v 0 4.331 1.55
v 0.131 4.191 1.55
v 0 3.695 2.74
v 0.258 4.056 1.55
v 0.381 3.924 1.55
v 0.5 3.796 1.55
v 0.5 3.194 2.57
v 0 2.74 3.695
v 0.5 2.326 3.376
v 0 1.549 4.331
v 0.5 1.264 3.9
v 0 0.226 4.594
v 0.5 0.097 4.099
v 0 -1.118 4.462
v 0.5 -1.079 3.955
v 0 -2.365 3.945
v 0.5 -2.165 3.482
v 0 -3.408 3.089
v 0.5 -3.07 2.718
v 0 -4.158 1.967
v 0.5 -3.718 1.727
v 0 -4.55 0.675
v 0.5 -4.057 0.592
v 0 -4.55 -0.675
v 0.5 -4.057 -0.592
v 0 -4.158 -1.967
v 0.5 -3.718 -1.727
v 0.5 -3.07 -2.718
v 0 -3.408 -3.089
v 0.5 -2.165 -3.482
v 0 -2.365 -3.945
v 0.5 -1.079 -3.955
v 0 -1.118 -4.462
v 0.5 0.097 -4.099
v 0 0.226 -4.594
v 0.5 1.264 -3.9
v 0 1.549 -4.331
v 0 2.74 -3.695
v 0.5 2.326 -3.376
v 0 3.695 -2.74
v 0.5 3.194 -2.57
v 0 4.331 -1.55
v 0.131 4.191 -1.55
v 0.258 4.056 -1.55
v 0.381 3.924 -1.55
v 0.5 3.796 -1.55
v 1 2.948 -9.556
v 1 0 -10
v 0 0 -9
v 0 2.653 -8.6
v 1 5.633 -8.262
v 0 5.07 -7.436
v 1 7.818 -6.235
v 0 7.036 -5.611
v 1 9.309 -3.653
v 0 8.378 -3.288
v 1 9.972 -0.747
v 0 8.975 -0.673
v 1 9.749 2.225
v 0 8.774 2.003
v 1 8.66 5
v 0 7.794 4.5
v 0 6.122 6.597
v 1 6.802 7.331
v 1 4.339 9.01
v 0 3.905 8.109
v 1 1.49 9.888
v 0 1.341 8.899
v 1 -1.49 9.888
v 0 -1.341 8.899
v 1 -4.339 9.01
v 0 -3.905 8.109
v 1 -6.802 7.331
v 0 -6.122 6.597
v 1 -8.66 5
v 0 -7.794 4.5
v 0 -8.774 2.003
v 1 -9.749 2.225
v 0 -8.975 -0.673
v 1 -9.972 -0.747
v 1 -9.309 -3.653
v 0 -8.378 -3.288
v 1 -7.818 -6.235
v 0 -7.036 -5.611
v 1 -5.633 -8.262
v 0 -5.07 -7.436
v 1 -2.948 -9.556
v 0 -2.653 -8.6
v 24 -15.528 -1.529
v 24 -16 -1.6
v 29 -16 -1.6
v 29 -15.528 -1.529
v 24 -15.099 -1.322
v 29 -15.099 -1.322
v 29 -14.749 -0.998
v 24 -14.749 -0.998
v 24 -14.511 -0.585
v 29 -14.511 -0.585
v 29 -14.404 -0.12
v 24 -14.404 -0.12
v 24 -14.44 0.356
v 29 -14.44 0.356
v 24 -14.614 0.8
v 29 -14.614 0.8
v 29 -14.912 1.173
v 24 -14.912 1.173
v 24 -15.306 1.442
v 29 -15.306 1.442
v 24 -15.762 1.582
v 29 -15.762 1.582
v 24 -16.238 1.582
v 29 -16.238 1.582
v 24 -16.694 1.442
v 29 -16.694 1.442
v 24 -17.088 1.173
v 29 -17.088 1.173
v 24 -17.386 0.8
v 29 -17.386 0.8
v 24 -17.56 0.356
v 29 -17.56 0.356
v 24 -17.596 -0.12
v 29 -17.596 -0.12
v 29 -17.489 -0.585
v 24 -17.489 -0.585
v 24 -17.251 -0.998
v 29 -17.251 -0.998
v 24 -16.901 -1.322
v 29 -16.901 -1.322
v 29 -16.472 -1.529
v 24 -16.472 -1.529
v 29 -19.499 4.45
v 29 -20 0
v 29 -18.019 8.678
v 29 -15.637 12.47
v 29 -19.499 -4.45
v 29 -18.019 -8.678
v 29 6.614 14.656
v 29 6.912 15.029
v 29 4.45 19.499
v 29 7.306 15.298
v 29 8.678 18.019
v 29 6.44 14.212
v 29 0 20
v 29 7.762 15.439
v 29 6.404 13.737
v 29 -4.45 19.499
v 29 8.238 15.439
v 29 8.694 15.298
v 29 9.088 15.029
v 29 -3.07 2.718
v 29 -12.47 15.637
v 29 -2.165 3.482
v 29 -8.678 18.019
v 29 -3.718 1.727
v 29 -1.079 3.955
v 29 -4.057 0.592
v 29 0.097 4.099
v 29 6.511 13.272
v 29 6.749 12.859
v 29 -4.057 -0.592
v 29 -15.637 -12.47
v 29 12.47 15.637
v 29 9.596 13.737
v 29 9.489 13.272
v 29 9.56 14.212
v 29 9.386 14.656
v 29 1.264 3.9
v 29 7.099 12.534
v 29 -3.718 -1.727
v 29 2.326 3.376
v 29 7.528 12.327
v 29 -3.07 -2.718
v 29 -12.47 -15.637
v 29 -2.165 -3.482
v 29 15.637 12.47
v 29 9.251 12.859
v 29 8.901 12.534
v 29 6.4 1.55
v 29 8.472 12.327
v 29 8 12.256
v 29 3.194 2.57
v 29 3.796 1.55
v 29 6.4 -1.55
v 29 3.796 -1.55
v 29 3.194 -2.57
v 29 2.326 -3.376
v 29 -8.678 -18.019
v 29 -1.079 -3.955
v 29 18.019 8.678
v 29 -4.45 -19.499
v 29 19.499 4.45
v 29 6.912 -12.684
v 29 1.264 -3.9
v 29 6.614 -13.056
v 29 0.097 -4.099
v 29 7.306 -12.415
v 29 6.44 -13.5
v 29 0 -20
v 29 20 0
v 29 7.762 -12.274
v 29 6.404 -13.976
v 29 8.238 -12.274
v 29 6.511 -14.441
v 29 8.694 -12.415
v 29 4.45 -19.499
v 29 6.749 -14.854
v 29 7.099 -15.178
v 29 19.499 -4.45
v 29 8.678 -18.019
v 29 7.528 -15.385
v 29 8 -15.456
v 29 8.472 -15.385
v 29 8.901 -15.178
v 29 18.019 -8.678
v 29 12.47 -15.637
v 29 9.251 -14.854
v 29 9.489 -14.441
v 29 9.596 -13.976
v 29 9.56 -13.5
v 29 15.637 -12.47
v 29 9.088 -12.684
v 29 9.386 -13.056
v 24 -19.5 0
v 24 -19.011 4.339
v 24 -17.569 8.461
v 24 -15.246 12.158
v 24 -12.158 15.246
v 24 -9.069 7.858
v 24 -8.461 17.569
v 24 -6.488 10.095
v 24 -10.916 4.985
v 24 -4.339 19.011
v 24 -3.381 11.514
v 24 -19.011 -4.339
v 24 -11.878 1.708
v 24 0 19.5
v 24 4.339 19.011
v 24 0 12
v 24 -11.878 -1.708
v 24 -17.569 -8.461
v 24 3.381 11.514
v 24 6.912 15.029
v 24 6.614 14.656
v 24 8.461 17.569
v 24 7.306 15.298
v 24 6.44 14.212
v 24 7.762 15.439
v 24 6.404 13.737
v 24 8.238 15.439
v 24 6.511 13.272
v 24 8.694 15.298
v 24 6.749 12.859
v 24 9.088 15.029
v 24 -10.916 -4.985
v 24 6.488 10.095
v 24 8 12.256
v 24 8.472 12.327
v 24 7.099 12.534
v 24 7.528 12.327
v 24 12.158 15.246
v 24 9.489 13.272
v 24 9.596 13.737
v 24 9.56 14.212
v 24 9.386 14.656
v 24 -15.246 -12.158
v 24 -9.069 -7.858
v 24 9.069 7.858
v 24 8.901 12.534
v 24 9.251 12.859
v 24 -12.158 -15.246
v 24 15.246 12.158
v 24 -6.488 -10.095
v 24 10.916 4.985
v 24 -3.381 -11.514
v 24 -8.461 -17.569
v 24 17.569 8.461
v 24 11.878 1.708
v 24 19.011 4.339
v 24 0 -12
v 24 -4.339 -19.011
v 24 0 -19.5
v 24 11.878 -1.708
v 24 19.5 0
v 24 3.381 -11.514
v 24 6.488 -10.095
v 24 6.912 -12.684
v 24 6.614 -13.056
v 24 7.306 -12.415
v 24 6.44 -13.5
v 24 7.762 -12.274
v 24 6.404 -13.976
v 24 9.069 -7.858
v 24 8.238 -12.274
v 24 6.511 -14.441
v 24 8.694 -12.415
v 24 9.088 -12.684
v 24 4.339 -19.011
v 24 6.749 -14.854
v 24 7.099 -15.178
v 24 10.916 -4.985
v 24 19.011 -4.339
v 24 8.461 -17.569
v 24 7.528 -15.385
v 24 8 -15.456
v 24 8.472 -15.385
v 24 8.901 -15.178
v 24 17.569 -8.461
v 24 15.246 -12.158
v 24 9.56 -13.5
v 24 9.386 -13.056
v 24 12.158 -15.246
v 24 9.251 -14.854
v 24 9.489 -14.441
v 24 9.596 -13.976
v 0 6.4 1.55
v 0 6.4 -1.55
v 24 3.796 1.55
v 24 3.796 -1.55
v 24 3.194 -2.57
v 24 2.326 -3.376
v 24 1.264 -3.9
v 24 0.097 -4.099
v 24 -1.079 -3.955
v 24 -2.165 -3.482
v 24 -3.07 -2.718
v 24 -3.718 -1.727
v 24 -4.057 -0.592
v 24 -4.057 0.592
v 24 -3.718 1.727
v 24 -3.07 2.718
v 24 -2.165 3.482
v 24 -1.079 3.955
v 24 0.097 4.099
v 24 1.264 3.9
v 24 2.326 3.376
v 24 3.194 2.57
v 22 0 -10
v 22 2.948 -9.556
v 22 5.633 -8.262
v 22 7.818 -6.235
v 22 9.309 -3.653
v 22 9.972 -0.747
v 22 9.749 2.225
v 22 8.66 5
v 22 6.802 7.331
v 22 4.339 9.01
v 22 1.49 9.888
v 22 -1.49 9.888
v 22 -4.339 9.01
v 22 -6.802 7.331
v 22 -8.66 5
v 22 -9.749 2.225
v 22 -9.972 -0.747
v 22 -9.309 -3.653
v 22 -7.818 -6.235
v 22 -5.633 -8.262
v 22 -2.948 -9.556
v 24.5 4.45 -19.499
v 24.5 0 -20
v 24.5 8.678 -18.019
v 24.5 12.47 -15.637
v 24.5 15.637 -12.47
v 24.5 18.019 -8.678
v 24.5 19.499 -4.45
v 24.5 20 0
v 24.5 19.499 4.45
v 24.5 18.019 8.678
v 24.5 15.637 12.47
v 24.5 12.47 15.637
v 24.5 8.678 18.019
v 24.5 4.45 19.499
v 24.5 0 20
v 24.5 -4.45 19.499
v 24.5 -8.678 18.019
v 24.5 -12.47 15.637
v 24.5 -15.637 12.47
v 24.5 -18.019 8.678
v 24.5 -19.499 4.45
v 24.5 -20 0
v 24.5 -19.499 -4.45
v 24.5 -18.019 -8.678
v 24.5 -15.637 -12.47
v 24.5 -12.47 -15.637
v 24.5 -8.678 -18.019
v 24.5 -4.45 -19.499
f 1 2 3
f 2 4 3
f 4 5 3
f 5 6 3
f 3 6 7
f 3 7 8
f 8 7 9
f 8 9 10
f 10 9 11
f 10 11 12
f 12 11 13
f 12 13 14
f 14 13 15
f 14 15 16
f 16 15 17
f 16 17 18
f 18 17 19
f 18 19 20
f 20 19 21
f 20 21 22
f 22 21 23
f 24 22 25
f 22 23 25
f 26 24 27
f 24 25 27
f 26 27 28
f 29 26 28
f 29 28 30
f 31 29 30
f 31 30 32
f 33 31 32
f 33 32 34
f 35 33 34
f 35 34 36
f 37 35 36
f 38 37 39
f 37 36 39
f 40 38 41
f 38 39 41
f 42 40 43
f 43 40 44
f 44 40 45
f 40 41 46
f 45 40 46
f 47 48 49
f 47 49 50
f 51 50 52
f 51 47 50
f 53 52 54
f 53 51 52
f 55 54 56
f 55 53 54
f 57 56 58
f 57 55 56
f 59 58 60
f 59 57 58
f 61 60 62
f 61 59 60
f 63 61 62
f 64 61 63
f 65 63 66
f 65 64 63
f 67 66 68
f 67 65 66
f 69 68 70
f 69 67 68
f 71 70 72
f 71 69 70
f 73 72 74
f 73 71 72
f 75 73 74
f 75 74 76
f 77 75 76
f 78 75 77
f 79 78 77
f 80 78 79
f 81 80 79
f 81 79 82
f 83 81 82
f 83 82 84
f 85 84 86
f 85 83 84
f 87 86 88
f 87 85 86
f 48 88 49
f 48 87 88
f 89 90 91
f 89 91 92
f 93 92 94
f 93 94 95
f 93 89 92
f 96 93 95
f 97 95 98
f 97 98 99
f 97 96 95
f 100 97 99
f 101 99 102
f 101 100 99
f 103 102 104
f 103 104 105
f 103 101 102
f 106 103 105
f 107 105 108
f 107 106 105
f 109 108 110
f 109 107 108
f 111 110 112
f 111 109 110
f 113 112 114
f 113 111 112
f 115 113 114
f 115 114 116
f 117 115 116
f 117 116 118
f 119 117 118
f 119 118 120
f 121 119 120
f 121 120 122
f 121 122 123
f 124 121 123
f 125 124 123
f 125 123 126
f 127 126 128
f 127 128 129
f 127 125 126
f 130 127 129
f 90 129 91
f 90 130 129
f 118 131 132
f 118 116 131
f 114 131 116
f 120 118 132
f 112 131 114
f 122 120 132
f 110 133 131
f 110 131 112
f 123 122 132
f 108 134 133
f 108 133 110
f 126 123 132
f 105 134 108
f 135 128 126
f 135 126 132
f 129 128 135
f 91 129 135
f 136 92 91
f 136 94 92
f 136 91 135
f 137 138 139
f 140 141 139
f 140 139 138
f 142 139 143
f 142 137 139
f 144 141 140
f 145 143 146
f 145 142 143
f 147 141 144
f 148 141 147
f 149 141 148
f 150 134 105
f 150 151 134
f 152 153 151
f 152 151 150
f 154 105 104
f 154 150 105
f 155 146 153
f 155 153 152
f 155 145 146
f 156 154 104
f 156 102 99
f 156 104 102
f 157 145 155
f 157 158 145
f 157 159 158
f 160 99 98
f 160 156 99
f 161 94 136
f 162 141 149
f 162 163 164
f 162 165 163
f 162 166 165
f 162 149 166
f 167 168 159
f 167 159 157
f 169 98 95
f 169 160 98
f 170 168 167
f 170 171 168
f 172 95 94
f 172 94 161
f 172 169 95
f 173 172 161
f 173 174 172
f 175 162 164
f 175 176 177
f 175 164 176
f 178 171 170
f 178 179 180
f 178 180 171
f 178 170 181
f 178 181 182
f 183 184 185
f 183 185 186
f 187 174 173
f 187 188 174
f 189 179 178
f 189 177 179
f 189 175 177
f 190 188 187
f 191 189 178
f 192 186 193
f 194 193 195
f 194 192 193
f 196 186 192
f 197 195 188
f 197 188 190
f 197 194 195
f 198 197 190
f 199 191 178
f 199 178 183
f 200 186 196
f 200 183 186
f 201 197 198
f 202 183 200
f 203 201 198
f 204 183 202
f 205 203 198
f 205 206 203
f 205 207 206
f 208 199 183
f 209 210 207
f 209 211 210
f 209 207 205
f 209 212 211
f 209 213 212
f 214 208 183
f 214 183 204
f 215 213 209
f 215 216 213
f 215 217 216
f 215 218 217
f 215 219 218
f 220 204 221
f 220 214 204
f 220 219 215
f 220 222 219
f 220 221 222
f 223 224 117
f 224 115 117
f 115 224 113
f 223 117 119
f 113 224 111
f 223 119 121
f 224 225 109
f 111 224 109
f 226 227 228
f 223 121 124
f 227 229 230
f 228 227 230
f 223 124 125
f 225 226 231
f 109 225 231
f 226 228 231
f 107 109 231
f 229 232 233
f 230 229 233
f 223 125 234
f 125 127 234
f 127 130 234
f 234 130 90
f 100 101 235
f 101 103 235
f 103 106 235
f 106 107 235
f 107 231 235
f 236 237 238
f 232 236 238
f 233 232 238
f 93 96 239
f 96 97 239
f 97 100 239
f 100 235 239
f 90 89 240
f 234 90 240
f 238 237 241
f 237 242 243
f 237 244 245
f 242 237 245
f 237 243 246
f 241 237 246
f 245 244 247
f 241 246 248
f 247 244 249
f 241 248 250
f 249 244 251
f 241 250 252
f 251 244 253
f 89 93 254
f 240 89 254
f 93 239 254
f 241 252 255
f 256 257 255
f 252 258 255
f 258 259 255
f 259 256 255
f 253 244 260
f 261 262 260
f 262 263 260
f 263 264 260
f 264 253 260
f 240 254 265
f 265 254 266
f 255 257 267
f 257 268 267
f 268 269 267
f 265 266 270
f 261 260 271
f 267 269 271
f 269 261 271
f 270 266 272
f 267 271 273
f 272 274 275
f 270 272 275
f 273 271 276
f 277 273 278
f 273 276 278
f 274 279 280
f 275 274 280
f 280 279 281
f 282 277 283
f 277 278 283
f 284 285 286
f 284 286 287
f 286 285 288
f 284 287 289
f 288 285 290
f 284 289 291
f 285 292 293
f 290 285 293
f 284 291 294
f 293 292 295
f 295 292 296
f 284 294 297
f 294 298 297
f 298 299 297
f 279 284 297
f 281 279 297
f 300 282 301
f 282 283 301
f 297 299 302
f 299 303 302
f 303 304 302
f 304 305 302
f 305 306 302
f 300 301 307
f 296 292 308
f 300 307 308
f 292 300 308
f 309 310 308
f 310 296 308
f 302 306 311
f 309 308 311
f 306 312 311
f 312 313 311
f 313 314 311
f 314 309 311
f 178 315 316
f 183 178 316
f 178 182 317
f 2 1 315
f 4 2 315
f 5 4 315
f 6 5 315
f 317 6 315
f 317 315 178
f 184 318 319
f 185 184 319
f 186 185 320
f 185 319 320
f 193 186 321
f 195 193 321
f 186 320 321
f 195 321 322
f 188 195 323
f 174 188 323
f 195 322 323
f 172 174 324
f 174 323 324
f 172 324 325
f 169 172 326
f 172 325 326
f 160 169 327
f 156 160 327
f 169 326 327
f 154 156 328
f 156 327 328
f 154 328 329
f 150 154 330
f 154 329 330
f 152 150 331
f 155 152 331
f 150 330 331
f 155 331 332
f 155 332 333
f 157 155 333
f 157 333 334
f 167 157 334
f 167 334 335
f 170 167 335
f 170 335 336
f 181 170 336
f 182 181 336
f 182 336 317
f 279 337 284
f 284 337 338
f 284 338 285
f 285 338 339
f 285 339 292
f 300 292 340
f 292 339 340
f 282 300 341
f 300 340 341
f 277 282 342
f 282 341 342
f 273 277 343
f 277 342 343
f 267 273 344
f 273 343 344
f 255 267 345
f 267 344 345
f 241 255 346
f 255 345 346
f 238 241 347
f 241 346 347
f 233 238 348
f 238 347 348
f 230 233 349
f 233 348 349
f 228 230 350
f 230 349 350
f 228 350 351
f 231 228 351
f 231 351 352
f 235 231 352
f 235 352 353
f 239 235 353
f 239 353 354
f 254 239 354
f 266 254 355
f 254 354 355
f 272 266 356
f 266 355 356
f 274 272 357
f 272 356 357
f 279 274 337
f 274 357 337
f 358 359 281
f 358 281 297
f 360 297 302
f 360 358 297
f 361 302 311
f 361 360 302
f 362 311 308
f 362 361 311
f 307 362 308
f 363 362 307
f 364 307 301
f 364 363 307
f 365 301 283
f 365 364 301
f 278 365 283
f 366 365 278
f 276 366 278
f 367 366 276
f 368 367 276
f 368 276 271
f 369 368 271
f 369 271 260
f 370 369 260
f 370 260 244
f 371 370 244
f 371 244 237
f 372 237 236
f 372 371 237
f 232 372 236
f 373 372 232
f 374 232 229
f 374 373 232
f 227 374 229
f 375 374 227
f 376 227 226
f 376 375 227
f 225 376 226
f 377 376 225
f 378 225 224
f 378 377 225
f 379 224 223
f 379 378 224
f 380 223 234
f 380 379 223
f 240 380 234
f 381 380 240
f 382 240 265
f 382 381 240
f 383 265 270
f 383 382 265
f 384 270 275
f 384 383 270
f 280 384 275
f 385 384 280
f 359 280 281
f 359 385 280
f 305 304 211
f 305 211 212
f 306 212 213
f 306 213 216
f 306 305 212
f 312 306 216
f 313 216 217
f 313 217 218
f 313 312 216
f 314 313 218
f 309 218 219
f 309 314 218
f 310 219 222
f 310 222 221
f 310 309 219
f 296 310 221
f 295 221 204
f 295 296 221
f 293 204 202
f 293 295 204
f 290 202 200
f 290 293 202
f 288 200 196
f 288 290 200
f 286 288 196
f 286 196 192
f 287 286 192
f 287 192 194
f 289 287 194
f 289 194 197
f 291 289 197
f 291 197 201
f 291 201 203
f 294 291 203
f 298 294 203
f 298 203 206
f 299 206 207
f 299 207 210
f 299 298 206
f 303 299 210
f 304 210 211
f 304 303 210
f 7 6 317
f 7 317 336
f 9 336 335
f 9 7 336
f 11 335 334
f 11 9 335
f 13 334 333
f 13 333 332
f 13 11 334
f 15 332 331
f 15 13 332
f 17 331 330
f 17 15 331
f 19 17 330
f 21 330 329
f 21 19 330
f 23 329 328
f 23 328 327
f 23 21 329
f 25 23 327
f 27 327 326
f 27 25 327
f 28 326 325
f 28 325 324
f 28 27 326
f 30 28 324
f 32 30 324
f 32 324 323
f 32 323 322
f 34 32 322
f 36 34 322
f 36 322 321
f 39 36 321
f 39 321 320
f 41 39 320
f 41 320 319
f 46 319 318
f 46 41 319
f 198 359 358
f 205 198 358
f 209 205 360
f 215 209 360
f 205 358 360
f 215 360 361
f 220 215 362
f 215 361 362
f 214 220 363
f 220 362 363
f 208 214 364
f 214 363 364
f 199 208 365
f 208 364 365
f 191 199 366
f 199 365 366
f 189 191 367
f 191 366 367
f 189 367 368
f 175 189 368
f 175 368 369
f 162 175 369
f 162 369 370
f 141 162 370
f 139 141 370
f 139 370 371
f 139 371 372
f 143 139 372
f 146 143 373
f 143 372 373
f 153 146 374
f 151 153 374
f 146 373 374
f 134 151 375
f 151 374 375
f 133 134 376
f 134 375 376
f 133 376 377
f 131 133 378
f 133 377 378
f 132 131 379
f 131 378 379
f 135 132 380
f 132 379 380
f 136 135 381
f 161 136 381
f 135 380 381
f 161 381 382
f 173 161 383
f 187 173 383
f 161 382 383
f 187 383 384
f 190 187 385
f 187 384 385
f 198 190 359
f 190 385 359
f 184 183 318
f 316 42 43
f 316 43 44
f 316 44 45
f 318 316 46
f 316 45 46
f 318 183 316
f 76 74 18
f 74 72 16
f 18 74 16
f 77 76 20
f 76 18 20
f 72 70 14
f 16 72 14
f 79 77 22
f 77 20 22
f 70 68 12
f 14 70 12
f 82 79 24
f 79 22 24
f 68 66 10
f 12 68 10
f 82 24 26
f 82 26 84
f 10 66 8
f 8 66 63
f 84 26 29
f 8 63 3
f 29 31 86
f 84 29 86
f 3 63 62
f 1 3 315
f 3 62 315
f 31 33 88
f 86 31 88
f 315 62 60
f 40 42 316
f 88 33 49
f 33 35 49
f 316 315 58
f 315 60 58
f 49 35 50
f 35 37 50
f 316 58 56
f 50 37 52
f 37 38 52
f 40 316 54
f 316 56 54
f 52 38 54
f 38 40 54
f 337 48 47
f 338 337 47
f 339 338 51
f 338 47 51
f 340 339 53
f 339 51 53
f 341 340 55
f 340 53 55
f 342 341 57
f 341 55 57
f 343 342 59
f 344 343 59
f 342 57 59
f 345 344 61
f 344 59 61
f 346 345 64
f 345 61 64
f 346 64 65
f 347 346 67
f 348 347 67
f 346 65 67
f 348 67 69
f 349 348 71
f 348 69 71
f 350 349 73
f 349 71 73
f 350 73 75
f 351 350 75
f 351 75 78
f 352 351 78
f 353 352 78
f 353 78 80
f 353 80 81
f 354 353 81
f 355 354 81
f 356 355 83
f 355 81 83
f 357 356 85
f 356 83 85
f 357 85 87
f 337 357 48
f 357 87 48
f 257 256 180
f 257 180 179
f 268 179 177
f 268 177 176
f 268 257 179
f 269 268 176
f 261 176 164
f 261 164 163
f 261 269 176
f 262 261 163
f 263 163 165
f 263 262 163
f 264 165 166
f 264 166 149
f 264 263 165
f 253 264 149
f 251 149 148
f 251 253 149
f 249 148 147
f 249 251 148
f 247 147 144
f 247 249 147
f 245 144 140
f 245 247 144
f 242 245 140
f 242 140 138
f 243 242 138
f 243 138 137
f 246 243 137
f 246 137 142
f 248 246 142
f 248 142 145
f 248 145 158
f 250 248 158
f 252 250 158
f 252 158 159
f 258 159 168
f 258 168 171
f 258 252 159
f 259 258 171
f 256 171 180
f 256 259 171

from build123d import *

# Parameters (mm, degrees)
SKETCH_1_R          = 10
EXTRUDE_1_DEPTH     = 24
SKETCH_2_R          = 20
SKETCH_2_R_2        = 1.6
EXTRUDE_2_DEPTH     = 5
CHAMFER_1_SIZE      = 0.5
CHAMFER_2_SIZE      = 1
CHAMFER_3_SIZE      = 0.5
CHAMFER_4_SIZE      = 2
CUT_EXTRUDE_1_DEPTH = 10


with BuildPart() as part:
    # 草图1 → 凸台-拉伸1 (new body)
    with BuildSketch(Plane(origin=(0, 0, 0), x_dir=(0, 0, -1), z_dir=(1, 0, 0))):
        Circle(SKETCH_1_R)
        with BuildLine():
            Line((0, 6.4), (-1.55, 6.4))
            Line((-1.55, 6.4), (-1.55, 3.795721275))
            ThreePointArc((-1.55, 3.795721275), (0, -4.1), (1.55, 3.795721275))
            Line((1.55, 3.795721275), (1.55, 6.4))
            Line((1.55, 6.4), (0, 6.4))
        make_face(mode=Mode.SUBTRACT)
    extrude(amount=EXTRUDE_1_DEPTH)

    # 草图2 → 凸台-拉伸2 (add)
    with BuildSketch(Plane(origin=(24, 0, 0), x_dir=(0, 0, -1), z_dir=(1, 0, 0))):
        Circle(SKETCH_2_R)
        with Locations((-13.856406461, 8)):
            Circle(SKETCH_2_R_2, mode=Mode.SUBTRACT)
        with Locations((13.856406461, 8)):
            Circle(SKETCH_2_R_2, mode=Mode.SUBTRACT)
        with Locations((0, -16)):
            Circle(SKETCH_2_R_2, mode=Mode.SUBTRACT)
    extrude(amount=EXTRUDE_2_DEPTH)

    # 倒角1
    chamfer_1_edges = [part.edges().sort_by_distance(p)[0] for p in [
        (0, -4.1, 0),
    ]]
    chamfer(chamfer_1_edges, length=CHAMFER_1_SIZE)

    # 倒角2
    chamfer_2_edges = [part.edges().sort_by_distance(p)[0] for p in [
        (0, 0, 10),
    ]]
    chamfer(chamfer_2_edges, length=CHAMFER_2_SIZE)

    # 倒角3
    chamfer_3_edges = [part.edges().sort_by_distance(p)[0] for p in [
        (24, 0, 20),
    ]]
    chamfer(chamfer_3_edges, length=CHAMFER_3_SIZE)

    # 倒角4
    chamfer_4_edges = [part.edges().sort_by_distance(p)[0] for p in [
        (24, 0, 10),
    ]]
    chamfer(chamfer_4_edges, length=CHAMFER_4_SIZE)

    # 草图3 → 切除-拉伸1 (cut)
    with BuildSketch(Plane.ZY.offset(-24)):
        with BuildLine():
            Line((0, 6.4), (-1.55, 6.4))
            Line((-1.55, 6.4), (-1.55, 3.795721275))
            ThreePointArc((-1.55, 3.795721275), (0, -4.1), (1.55, 3.795721275))
            Line((1.55, 3.795721275), (1.55, 6.4))
            Line((1.55, 6.4), (0, 6.4))
        make_face()
    extrude(amount=-CUT_EXTRUDE_1_DEPTH, mode=Mode.SUBTRACT)


solid = part.part
